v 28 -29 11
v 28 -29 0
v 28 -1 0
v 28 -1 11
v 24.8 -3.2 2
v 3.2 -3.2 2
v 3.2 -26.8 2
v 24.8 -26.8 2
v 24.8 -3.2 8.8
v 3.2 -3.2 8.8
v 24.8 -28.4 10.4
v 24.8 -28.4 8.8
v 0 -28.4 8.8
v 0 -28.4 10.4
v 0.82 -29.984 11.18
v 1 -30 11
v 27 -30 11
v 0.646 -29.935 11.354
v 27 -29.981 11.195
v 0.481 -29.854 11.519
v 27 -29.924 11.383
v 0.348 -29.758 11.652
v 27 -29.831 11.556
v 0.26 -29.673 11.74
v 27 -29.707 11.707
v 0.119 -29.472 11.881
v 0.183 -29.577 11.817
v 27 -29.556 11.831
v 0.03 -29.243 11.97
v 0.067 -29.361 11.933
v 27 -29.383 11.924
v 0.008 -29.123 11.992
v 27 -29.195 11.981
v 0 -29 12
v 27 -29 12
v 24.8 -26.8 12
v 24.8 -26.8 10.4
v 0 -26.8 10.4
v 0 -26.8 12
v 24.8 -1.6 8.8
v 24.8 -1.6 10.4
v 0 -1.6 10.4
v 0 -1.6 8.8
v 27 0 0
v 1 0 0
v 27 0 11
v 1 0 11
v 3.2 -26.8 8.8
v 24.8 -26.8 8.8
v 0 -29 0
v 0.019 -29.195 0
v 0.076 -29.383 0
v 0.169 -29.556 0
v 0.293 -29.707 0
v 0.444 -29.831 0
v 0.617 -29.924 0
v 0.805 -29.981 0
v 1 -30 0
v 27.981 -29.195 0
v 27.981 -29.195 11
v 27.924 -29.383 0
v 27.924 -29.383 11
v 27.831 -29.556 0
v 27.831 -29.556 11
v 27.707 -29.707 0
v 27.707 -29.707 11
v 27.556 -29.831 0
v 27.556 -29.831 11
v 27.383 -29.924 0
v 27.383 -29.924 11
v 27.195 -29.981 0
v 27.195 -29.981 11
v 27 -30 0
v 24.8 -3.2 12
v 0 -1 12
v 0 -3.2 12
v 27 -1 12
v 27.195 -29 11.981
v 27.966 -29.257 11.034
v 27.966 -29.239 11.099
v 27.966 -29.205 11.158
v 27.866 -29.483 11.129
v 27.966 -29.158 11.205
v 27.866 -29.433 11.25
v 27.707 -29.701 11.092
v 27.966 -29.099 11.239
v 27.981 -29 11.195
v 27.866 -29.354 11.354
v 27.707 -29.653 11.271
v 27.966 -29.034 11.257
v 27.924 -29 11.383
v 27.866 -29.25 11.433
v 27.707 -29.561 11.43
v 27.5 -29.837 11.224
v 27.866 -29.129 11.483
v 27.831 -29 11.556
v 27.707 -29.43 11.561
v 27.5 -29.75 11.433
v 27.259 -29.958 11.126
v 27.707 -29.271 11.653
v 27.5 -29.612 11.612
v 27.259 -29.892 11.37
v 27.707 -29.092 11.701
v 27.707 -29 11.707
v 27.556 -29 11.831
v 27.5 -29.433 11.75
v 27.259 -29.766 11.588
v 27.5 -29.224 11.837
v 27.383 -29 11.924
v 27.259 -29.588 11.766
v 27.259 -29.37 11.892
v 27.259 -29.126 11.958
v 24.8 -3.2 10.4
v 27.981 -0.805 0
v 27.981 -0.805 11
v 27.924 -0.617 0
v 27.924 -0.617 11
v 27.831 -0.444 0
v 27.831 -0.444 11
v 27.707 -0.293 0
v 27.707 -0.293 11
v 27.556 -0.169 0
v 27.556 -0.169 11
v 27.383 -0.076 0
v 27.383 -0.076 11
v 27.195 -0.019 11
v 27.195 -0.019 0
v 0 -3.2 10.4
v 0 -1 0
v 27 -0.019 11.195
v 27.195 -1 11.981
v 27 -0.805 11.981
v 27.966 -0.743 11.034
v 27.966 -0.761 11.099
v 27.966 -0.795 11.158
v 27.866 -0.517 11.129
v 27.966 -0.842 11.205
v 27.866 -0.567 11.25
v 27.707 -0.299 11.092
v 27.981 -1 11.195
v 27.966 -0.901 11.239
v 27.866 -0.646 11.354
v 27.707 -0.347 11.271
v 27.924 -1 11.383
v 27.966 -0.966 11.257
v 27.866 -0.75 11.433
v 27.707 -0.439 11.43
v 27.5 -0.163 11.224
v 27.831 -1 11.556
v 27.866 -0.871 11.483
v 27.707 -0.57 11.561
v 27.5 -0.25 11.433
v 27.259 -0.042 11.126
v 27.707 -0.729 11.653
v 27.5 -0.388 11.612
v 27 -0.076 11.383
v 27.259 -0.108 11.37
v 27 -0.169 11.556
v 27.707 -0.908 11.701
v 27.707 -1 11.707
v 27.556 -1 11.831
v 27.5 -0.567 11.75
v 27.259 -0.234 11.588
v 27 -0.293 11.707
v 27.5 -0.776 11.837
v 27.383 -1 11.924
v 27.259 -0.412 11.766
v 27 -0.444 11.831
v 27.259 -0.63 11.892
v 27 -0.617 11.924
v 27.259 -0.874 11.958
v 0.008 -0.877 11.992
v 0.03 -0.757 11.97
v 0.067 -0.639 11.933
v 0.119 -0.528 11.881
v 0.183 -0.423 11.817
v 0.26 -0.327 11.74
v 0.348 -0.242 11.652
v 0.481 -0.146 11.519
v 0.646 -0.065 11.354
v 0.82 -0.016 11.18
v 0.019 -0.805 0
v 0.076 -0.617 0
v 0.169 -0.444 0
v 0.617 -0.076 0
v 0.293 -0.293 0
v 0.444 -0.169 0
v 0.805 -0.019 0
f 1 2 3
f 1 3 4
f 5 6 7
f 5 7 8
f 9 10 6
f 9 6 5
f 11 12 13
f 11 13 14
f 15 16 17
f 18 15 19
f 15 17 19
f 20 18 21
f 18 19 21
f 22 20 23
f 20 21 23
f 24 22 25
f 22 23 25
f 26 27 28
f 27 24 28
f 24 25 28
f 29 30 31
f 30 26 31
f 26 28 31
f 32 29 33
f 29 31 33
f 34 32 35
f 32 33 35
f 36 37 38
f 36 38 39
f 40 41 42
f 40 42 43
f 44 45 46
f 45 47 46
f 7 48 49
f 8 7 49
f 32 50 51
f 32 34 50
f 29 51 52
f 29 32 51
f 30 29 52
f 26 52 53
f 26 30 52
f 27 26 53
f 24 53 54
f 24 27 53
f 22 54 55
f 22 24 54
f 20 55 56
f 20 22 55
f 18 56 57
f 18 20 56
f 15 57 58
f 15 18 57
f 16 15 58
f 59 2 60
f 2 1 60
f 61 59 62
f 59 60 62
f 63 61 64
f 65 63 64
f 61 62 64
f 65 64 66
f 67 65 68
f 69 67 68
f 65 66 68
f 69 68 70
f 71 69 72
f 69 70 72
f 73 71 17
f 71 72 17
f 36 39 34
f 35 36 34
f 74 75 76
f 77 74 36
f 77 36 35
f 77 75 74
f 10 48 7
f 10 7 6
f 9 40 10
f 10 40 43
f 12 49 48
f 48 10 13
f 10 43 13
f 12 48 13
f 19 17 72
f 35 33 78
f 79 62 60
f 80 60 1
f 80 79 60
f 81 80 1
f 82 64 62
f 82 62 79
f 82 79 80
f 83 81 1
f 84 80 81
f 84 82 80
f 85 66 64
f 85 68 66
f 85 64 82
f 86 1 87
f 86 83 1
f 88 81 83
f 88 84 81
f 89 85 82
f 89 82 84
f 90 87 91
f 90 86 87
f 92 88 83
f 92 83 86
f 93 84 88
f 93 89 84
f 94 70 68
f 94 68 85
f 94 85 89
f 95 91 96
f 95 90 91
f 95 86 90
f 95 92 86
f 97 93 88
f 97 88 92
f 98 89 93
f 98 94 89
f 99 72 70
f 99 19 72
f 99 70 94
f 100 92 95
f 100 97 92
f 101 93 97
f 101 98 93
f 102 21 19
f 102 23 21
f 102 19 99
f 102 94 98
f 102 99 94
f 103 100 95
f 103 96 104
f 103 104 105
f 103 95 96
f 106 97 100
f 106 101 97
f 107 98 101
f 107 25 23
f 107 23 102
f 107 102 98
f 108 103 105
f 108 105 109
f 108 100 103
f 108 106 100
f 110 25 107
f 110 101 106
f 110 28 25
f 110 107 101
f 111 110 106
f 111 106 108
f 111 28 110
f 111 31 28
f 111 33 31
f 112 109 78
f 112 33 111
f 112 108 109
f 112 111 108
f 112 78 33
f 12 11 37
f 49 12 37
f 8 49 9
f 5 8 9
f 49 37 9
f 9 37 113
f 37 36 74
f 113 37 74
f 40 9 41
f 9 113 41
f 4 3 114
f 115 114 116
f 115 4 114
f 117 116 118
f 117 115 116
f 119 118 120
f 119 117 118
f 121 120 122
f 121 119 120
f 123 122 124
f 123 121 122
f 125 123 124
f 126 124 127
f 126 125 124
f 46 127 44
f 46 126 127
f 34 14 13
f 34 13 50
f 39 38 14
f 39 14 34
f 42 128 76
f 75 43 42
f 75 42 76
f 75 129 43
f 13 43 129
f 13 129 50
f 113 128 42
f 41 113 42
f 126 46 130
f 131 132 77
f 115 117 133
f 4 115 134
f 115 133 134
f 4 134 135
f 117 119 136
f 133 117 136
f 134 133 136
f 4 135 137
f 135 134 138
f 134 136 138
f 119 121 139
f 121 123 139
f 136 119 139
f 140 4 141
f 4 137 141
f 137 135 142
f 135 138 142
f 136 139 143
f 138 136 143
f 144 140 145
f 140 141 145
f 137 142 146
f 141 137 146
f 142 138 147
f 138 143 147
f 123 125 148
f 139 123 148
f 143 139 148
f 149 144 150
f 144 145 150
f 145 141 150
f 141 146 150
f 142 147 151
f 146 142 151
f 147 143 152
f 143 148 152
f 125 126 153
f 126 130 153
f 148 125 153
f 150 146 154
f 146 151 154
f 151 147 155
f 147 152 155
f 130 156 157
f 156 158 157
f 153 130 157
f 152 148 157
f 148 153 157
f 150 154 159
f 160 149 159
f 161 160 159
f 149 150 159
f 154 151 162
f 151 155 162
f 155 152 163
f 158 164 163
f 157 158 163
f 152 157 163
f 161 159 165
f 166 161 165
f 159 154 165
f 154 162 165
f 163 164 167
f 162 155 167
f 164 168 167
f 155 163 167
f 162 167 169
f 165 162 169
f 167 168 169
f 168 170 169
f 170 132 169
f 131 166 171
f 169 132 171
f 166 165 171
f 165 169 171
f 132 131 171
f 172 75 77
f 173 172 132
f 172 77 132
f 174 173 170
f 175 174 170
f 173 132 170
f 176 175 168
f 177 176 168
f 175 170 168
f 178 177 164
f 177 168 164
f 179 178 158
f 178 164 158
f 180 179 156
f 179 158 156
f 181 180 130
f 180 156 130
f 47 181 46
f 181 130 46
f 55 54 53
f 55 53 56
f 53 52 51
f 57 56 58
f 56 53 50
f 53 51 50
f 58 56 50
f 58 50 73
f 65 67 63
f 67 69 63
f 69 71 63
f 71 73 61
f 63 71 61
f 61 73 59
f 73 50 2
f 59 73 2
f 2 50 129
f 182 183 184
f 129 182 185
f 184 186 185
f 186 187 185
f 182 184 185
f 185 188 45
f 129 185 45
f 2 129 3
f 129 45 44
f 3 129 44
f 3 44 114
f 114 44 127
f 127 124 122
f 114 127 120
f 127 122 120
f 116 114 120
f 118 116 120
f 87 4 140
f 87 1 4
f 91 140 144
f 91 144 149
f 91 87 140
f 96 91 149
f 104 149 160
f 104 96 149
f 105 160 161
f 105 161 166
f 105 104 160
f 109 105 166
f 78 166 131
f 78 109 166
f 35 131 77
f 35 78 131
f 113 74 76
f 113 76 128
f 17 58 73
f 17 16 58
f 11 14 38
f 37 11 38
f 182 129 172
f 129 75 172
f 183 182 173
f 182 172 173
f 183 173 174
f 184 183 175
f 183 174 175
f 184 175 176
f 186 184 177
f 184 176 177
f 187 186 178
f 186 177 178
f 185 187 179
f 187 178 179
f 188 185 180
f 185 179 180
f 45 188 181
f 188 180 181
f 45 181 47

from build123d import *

# Parameters (mm, degrees)
F0_W     = 28
F0_H     = 12
F1_DEPTH = 30
F2_W     = 21.6
F2_H     = 23.6
F3_DEPTH = 10
F5_DEPTH = 24.8
F6_R     = 1


with BuildPart() as f1:
    # F0 (on Front) → F1 (new body)
    with BuildSketch(Plane.XZ):
        with Locations((14, 6)):
            Rectangle(F0_W, F0_H)
    extrude(amount=F1_DEPTH)

    # F2 (on face) → F3 (cut)
    with BuildSketch(Plane.XY.offset(12)):
        with Locations((14, -15)):
            Rectangle(F2_W, F2_H)
    extrude(amount=-F3_DEPTH, mode=Mode.SUBTRACT)

    # F4 (on face) → F5 (cut, through all)
    with BuildSketch(Plane(origin=(0, 0, 0), x_dir=(0, -1, 0), z_dir=(-1, 0, 0))):
        Polygon((3.2, 10.4), (1.6, 10.4), (1.6, 8.8), (3.2, 8.8), (15, 8.8), (26.8, 8.8), (28.4, 8.8), (28.4, 10.4), (26.8, 10.4), (26.8, 12), (3.2, 12), align=None)
    extrude(amount=-F5_DEPTH, mode=Mode.SUBTRACT)

    # F6
    f6_edges = [f1.edges().sort_by_distance(p)[0] for p in [
        (0, 0, 6),
        (14, 0, 12),
        (0, -30, 6),
        (14, -30, 12),
        (28, 0, 6),
        (28, -30, 6),
        (28, -15, 12),
    ]]
    fillet(f6_edges, radius=F6_R)


solid = f1.part
